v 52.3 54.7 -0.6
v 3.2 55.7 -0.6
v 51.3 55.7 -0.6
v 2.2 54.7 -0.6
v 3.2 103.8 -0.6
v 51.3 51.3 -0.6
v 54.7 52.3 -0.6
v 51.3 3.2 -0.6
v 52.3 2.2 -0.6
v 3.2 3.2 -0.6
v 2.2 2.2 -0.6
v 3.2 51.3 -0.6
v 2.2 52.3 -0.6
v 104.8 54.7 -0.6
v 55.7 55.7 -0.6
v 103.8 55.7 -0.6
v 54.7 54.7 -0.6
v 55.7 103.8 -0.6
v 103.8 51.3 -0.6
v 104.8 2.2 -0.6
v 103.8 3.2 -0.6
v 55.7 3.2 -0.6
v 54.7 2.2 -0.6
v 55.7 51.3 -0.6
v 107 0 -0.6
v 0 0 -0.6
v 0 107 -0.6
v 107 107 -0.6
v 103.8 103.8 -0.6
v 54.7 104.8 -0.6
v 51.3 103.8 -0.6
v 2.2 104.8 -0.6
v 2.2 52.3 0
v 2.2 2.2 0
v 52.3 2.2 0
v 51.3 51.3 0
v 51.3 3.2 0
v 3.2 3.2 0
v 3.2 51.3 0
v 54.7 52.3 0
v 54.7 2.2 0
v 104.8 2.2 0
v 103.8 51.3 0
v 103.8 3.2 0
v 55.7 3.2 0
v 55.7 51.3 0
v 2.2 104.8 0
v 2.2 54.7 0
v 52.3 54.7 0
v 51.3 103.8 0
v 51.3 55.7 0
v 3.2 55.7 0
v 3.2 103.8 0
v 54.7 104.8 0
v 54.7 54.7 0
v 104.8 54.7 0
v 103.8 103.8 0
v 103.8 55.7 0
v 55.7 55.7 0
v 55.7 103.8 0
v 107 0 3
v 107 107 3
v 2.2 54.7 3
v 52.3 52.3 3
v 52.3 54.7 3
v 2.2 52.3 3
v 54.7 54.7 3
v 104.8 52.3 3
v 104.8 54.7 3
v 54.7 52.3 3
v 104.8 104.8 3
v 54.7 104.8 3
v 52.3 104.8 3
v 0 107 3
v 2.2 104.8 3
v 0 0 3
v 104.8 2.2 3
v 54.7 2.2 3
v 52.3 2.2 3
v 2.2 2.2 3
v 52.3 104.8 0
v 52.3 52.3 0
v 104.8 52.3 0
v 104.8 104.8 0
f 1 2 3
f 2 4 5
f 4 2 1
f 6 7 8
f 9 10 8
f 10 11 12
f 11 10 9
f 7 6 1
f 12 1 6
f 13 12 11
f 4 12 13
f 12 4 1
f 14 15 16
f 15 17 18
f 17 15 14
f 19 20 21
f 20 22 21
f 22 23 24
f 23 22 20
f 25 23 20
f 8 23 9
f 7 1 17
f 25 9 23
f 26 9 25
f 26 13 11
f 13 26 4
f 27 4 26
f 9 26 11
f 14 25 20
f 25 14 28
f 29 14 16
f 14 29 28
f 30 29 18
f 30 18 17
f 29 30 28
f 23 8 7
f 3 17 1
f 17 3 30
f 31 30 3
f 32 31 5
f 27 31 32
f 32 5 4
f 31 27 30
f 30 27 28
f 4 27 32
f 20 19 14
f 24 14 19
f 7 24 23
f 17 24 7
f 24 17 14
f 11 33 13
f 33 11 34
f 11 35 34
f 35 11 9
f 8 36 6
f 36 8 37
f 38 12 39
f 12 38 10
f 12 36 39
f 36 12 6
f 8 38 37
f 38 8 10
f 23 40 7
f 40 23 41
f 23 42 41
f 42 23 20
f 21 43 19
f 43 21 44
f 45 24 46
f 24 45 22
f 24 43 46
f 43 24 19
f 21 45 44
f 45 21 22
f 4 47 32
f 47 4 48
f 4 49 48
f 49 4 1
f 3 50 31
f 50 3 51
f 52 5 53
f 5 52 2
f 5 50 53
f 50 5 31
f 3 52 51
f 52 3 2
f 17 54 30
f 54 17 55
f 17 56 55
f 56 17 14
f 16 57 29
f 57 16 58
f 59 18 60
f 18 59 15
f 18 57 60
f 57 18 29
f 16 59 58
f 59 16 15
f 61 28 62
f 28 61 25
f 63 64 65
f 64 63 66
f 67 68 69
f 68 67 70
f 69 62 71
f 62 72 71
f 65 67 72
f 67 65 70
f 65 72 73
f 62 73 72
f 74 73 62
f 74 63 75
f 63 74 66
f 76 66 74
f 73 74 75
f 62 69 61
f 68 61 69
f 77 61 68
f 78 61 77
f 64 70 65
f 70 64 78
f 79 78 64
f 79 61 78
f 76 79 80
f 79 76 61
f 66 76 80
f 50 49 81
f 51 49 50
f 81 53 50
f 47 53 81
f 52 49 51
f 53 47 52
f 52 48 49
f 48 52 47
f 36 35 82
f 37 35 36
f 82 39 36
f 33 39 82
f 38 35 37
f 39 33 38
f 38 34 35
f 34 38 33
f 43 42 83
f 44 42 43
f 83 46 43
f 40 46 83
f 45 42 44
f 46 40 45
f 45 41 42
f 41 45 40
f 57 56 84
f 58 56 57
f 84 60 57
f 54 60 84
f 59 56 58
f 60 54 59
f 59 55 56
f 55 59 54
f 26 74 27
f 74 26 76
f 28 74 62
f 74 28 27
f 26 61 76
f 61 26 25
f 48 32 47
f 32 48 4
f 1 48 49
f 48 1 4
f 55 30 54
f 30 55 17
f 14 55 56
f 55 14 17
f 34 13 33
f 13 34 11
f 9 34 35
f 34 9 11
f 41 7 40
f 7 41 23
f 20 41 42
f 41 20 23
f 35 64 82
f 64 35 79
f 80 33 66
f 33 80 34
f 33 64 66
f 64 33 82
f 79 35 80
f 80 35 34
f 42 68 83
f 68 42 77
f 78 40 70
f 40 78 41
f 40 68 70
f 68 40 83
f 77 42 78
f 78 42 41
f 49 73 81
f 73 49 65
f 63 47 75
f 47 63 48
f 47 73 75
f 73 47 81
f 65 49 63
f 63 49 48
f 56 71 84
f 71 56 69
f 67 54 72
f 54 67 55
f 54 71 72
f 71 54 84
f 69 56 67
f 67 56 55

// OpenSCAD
// Adjustable size cell baseplate with wall-only underlay + internal shelves for tiles
// Adjust rows/cols for different plate sizes (e.g., 3x3, 4x1, 4x2)
rows = 2;
cols = 2;

cell = 50.5;             // cell size (mm)
wall = 2;              // wall thickness between/around cells (mm)
height = 3;            // total wall height (mm)
underlay_thick = 0.6;  // thickness of material under walls only (mm)
gap = 0.2;             // clearance per side inside each cell (tune for fit)

// Shelf parameters (tile support ledge inside each cell)
shelf_height = 2.0;    // distance below top surface where shelf sits (mm)
shelf_width  = 1.0;    // radial width of shelf from wall inward (mm)
shelf_thick  = 1.6;    // thickness of the shelf rib (mm)

// Derived dimensions
plate_w = cols*cell + (cols+1)*wall;  // outer width
plate_d = rows*cell + (rows+1)*wall;  // outer depth
inner_cell = cell - 2*gap;            // interior opening after gap

module baseplate() {
  difference() {
    // Main block + underlay ribs
    union() {
      cube([plate_w, plate_d, height], center=false);
      // Underlay ribs beneath all walls
      translate([0, 0, -underlay_thick])
        walls_2d_extrude(underlay_thick);

      // Add shelves inside each cell
      shelves();
    }

    // Hollow out cell interiors (down through shelves where appropriate)
    for (r = [0:rows-1])
      for (c = [0:cols-1]) {
        translate([
          wall + c*(cell + wall) + gap,
          wall + r*(cell + wall) + gap,
          0
        ])
        cube([inner_cell, inner_cell, height + underlay_thick + 1], center=false);
      }
  }
}

// Shelves: thin ledges inset from each wall, at shelf_height below top
module shelves() {
  z = height - shelf_height - shelf_thick; // bottom of shelf rib
  for (r = [0:rows-1])
    for (c = [0:cols-1]) {
      // Cell inner corner
      x0 = wall + c*(cell + wall) + gap;
      y0 = wall + r*(cell + wall) + gap;

      // Shelf outer rectangle follows the cell opening boundary
      // We subtract an inner rectangle to make the shelf only shelf_width deep
      difference() {
        translate([x0, y0, z])
          cube([inner_cell, inner_cell, shelf_thick], center=false);

        // Inner cutout to leave a perimeter ring (the actual shelf)
        translate([x0 + shelf_width, y0 + shelf_width, z - 0.1])
          cube([inner_cell - 2*shelf_width, inner_cell - 2*shelf_width,
                shelf_thick + 0.2], center=false);
      }
    }
}

// 2D wall layout extruded to create the underlay ribs
module walls_2d_extrude(th) {
  linear_extrude(th)
    walls_2d();
}

module walls_2d() {
  difference() {
    // Outer boundary
    square([plate_w, plate_d], center=false);

    // Subtract openings for each cell (leaving only walls)
    for (r = [0:rows-1])
      for (c = [0:cols-1]) {
        translate([
          wall + c*(cell + wall) + gap,
          wall + r*(cell + wall) + gap
        ])
        square([inner_cell, inner_cell], center=false);
      }
  }
}

baseplate();
